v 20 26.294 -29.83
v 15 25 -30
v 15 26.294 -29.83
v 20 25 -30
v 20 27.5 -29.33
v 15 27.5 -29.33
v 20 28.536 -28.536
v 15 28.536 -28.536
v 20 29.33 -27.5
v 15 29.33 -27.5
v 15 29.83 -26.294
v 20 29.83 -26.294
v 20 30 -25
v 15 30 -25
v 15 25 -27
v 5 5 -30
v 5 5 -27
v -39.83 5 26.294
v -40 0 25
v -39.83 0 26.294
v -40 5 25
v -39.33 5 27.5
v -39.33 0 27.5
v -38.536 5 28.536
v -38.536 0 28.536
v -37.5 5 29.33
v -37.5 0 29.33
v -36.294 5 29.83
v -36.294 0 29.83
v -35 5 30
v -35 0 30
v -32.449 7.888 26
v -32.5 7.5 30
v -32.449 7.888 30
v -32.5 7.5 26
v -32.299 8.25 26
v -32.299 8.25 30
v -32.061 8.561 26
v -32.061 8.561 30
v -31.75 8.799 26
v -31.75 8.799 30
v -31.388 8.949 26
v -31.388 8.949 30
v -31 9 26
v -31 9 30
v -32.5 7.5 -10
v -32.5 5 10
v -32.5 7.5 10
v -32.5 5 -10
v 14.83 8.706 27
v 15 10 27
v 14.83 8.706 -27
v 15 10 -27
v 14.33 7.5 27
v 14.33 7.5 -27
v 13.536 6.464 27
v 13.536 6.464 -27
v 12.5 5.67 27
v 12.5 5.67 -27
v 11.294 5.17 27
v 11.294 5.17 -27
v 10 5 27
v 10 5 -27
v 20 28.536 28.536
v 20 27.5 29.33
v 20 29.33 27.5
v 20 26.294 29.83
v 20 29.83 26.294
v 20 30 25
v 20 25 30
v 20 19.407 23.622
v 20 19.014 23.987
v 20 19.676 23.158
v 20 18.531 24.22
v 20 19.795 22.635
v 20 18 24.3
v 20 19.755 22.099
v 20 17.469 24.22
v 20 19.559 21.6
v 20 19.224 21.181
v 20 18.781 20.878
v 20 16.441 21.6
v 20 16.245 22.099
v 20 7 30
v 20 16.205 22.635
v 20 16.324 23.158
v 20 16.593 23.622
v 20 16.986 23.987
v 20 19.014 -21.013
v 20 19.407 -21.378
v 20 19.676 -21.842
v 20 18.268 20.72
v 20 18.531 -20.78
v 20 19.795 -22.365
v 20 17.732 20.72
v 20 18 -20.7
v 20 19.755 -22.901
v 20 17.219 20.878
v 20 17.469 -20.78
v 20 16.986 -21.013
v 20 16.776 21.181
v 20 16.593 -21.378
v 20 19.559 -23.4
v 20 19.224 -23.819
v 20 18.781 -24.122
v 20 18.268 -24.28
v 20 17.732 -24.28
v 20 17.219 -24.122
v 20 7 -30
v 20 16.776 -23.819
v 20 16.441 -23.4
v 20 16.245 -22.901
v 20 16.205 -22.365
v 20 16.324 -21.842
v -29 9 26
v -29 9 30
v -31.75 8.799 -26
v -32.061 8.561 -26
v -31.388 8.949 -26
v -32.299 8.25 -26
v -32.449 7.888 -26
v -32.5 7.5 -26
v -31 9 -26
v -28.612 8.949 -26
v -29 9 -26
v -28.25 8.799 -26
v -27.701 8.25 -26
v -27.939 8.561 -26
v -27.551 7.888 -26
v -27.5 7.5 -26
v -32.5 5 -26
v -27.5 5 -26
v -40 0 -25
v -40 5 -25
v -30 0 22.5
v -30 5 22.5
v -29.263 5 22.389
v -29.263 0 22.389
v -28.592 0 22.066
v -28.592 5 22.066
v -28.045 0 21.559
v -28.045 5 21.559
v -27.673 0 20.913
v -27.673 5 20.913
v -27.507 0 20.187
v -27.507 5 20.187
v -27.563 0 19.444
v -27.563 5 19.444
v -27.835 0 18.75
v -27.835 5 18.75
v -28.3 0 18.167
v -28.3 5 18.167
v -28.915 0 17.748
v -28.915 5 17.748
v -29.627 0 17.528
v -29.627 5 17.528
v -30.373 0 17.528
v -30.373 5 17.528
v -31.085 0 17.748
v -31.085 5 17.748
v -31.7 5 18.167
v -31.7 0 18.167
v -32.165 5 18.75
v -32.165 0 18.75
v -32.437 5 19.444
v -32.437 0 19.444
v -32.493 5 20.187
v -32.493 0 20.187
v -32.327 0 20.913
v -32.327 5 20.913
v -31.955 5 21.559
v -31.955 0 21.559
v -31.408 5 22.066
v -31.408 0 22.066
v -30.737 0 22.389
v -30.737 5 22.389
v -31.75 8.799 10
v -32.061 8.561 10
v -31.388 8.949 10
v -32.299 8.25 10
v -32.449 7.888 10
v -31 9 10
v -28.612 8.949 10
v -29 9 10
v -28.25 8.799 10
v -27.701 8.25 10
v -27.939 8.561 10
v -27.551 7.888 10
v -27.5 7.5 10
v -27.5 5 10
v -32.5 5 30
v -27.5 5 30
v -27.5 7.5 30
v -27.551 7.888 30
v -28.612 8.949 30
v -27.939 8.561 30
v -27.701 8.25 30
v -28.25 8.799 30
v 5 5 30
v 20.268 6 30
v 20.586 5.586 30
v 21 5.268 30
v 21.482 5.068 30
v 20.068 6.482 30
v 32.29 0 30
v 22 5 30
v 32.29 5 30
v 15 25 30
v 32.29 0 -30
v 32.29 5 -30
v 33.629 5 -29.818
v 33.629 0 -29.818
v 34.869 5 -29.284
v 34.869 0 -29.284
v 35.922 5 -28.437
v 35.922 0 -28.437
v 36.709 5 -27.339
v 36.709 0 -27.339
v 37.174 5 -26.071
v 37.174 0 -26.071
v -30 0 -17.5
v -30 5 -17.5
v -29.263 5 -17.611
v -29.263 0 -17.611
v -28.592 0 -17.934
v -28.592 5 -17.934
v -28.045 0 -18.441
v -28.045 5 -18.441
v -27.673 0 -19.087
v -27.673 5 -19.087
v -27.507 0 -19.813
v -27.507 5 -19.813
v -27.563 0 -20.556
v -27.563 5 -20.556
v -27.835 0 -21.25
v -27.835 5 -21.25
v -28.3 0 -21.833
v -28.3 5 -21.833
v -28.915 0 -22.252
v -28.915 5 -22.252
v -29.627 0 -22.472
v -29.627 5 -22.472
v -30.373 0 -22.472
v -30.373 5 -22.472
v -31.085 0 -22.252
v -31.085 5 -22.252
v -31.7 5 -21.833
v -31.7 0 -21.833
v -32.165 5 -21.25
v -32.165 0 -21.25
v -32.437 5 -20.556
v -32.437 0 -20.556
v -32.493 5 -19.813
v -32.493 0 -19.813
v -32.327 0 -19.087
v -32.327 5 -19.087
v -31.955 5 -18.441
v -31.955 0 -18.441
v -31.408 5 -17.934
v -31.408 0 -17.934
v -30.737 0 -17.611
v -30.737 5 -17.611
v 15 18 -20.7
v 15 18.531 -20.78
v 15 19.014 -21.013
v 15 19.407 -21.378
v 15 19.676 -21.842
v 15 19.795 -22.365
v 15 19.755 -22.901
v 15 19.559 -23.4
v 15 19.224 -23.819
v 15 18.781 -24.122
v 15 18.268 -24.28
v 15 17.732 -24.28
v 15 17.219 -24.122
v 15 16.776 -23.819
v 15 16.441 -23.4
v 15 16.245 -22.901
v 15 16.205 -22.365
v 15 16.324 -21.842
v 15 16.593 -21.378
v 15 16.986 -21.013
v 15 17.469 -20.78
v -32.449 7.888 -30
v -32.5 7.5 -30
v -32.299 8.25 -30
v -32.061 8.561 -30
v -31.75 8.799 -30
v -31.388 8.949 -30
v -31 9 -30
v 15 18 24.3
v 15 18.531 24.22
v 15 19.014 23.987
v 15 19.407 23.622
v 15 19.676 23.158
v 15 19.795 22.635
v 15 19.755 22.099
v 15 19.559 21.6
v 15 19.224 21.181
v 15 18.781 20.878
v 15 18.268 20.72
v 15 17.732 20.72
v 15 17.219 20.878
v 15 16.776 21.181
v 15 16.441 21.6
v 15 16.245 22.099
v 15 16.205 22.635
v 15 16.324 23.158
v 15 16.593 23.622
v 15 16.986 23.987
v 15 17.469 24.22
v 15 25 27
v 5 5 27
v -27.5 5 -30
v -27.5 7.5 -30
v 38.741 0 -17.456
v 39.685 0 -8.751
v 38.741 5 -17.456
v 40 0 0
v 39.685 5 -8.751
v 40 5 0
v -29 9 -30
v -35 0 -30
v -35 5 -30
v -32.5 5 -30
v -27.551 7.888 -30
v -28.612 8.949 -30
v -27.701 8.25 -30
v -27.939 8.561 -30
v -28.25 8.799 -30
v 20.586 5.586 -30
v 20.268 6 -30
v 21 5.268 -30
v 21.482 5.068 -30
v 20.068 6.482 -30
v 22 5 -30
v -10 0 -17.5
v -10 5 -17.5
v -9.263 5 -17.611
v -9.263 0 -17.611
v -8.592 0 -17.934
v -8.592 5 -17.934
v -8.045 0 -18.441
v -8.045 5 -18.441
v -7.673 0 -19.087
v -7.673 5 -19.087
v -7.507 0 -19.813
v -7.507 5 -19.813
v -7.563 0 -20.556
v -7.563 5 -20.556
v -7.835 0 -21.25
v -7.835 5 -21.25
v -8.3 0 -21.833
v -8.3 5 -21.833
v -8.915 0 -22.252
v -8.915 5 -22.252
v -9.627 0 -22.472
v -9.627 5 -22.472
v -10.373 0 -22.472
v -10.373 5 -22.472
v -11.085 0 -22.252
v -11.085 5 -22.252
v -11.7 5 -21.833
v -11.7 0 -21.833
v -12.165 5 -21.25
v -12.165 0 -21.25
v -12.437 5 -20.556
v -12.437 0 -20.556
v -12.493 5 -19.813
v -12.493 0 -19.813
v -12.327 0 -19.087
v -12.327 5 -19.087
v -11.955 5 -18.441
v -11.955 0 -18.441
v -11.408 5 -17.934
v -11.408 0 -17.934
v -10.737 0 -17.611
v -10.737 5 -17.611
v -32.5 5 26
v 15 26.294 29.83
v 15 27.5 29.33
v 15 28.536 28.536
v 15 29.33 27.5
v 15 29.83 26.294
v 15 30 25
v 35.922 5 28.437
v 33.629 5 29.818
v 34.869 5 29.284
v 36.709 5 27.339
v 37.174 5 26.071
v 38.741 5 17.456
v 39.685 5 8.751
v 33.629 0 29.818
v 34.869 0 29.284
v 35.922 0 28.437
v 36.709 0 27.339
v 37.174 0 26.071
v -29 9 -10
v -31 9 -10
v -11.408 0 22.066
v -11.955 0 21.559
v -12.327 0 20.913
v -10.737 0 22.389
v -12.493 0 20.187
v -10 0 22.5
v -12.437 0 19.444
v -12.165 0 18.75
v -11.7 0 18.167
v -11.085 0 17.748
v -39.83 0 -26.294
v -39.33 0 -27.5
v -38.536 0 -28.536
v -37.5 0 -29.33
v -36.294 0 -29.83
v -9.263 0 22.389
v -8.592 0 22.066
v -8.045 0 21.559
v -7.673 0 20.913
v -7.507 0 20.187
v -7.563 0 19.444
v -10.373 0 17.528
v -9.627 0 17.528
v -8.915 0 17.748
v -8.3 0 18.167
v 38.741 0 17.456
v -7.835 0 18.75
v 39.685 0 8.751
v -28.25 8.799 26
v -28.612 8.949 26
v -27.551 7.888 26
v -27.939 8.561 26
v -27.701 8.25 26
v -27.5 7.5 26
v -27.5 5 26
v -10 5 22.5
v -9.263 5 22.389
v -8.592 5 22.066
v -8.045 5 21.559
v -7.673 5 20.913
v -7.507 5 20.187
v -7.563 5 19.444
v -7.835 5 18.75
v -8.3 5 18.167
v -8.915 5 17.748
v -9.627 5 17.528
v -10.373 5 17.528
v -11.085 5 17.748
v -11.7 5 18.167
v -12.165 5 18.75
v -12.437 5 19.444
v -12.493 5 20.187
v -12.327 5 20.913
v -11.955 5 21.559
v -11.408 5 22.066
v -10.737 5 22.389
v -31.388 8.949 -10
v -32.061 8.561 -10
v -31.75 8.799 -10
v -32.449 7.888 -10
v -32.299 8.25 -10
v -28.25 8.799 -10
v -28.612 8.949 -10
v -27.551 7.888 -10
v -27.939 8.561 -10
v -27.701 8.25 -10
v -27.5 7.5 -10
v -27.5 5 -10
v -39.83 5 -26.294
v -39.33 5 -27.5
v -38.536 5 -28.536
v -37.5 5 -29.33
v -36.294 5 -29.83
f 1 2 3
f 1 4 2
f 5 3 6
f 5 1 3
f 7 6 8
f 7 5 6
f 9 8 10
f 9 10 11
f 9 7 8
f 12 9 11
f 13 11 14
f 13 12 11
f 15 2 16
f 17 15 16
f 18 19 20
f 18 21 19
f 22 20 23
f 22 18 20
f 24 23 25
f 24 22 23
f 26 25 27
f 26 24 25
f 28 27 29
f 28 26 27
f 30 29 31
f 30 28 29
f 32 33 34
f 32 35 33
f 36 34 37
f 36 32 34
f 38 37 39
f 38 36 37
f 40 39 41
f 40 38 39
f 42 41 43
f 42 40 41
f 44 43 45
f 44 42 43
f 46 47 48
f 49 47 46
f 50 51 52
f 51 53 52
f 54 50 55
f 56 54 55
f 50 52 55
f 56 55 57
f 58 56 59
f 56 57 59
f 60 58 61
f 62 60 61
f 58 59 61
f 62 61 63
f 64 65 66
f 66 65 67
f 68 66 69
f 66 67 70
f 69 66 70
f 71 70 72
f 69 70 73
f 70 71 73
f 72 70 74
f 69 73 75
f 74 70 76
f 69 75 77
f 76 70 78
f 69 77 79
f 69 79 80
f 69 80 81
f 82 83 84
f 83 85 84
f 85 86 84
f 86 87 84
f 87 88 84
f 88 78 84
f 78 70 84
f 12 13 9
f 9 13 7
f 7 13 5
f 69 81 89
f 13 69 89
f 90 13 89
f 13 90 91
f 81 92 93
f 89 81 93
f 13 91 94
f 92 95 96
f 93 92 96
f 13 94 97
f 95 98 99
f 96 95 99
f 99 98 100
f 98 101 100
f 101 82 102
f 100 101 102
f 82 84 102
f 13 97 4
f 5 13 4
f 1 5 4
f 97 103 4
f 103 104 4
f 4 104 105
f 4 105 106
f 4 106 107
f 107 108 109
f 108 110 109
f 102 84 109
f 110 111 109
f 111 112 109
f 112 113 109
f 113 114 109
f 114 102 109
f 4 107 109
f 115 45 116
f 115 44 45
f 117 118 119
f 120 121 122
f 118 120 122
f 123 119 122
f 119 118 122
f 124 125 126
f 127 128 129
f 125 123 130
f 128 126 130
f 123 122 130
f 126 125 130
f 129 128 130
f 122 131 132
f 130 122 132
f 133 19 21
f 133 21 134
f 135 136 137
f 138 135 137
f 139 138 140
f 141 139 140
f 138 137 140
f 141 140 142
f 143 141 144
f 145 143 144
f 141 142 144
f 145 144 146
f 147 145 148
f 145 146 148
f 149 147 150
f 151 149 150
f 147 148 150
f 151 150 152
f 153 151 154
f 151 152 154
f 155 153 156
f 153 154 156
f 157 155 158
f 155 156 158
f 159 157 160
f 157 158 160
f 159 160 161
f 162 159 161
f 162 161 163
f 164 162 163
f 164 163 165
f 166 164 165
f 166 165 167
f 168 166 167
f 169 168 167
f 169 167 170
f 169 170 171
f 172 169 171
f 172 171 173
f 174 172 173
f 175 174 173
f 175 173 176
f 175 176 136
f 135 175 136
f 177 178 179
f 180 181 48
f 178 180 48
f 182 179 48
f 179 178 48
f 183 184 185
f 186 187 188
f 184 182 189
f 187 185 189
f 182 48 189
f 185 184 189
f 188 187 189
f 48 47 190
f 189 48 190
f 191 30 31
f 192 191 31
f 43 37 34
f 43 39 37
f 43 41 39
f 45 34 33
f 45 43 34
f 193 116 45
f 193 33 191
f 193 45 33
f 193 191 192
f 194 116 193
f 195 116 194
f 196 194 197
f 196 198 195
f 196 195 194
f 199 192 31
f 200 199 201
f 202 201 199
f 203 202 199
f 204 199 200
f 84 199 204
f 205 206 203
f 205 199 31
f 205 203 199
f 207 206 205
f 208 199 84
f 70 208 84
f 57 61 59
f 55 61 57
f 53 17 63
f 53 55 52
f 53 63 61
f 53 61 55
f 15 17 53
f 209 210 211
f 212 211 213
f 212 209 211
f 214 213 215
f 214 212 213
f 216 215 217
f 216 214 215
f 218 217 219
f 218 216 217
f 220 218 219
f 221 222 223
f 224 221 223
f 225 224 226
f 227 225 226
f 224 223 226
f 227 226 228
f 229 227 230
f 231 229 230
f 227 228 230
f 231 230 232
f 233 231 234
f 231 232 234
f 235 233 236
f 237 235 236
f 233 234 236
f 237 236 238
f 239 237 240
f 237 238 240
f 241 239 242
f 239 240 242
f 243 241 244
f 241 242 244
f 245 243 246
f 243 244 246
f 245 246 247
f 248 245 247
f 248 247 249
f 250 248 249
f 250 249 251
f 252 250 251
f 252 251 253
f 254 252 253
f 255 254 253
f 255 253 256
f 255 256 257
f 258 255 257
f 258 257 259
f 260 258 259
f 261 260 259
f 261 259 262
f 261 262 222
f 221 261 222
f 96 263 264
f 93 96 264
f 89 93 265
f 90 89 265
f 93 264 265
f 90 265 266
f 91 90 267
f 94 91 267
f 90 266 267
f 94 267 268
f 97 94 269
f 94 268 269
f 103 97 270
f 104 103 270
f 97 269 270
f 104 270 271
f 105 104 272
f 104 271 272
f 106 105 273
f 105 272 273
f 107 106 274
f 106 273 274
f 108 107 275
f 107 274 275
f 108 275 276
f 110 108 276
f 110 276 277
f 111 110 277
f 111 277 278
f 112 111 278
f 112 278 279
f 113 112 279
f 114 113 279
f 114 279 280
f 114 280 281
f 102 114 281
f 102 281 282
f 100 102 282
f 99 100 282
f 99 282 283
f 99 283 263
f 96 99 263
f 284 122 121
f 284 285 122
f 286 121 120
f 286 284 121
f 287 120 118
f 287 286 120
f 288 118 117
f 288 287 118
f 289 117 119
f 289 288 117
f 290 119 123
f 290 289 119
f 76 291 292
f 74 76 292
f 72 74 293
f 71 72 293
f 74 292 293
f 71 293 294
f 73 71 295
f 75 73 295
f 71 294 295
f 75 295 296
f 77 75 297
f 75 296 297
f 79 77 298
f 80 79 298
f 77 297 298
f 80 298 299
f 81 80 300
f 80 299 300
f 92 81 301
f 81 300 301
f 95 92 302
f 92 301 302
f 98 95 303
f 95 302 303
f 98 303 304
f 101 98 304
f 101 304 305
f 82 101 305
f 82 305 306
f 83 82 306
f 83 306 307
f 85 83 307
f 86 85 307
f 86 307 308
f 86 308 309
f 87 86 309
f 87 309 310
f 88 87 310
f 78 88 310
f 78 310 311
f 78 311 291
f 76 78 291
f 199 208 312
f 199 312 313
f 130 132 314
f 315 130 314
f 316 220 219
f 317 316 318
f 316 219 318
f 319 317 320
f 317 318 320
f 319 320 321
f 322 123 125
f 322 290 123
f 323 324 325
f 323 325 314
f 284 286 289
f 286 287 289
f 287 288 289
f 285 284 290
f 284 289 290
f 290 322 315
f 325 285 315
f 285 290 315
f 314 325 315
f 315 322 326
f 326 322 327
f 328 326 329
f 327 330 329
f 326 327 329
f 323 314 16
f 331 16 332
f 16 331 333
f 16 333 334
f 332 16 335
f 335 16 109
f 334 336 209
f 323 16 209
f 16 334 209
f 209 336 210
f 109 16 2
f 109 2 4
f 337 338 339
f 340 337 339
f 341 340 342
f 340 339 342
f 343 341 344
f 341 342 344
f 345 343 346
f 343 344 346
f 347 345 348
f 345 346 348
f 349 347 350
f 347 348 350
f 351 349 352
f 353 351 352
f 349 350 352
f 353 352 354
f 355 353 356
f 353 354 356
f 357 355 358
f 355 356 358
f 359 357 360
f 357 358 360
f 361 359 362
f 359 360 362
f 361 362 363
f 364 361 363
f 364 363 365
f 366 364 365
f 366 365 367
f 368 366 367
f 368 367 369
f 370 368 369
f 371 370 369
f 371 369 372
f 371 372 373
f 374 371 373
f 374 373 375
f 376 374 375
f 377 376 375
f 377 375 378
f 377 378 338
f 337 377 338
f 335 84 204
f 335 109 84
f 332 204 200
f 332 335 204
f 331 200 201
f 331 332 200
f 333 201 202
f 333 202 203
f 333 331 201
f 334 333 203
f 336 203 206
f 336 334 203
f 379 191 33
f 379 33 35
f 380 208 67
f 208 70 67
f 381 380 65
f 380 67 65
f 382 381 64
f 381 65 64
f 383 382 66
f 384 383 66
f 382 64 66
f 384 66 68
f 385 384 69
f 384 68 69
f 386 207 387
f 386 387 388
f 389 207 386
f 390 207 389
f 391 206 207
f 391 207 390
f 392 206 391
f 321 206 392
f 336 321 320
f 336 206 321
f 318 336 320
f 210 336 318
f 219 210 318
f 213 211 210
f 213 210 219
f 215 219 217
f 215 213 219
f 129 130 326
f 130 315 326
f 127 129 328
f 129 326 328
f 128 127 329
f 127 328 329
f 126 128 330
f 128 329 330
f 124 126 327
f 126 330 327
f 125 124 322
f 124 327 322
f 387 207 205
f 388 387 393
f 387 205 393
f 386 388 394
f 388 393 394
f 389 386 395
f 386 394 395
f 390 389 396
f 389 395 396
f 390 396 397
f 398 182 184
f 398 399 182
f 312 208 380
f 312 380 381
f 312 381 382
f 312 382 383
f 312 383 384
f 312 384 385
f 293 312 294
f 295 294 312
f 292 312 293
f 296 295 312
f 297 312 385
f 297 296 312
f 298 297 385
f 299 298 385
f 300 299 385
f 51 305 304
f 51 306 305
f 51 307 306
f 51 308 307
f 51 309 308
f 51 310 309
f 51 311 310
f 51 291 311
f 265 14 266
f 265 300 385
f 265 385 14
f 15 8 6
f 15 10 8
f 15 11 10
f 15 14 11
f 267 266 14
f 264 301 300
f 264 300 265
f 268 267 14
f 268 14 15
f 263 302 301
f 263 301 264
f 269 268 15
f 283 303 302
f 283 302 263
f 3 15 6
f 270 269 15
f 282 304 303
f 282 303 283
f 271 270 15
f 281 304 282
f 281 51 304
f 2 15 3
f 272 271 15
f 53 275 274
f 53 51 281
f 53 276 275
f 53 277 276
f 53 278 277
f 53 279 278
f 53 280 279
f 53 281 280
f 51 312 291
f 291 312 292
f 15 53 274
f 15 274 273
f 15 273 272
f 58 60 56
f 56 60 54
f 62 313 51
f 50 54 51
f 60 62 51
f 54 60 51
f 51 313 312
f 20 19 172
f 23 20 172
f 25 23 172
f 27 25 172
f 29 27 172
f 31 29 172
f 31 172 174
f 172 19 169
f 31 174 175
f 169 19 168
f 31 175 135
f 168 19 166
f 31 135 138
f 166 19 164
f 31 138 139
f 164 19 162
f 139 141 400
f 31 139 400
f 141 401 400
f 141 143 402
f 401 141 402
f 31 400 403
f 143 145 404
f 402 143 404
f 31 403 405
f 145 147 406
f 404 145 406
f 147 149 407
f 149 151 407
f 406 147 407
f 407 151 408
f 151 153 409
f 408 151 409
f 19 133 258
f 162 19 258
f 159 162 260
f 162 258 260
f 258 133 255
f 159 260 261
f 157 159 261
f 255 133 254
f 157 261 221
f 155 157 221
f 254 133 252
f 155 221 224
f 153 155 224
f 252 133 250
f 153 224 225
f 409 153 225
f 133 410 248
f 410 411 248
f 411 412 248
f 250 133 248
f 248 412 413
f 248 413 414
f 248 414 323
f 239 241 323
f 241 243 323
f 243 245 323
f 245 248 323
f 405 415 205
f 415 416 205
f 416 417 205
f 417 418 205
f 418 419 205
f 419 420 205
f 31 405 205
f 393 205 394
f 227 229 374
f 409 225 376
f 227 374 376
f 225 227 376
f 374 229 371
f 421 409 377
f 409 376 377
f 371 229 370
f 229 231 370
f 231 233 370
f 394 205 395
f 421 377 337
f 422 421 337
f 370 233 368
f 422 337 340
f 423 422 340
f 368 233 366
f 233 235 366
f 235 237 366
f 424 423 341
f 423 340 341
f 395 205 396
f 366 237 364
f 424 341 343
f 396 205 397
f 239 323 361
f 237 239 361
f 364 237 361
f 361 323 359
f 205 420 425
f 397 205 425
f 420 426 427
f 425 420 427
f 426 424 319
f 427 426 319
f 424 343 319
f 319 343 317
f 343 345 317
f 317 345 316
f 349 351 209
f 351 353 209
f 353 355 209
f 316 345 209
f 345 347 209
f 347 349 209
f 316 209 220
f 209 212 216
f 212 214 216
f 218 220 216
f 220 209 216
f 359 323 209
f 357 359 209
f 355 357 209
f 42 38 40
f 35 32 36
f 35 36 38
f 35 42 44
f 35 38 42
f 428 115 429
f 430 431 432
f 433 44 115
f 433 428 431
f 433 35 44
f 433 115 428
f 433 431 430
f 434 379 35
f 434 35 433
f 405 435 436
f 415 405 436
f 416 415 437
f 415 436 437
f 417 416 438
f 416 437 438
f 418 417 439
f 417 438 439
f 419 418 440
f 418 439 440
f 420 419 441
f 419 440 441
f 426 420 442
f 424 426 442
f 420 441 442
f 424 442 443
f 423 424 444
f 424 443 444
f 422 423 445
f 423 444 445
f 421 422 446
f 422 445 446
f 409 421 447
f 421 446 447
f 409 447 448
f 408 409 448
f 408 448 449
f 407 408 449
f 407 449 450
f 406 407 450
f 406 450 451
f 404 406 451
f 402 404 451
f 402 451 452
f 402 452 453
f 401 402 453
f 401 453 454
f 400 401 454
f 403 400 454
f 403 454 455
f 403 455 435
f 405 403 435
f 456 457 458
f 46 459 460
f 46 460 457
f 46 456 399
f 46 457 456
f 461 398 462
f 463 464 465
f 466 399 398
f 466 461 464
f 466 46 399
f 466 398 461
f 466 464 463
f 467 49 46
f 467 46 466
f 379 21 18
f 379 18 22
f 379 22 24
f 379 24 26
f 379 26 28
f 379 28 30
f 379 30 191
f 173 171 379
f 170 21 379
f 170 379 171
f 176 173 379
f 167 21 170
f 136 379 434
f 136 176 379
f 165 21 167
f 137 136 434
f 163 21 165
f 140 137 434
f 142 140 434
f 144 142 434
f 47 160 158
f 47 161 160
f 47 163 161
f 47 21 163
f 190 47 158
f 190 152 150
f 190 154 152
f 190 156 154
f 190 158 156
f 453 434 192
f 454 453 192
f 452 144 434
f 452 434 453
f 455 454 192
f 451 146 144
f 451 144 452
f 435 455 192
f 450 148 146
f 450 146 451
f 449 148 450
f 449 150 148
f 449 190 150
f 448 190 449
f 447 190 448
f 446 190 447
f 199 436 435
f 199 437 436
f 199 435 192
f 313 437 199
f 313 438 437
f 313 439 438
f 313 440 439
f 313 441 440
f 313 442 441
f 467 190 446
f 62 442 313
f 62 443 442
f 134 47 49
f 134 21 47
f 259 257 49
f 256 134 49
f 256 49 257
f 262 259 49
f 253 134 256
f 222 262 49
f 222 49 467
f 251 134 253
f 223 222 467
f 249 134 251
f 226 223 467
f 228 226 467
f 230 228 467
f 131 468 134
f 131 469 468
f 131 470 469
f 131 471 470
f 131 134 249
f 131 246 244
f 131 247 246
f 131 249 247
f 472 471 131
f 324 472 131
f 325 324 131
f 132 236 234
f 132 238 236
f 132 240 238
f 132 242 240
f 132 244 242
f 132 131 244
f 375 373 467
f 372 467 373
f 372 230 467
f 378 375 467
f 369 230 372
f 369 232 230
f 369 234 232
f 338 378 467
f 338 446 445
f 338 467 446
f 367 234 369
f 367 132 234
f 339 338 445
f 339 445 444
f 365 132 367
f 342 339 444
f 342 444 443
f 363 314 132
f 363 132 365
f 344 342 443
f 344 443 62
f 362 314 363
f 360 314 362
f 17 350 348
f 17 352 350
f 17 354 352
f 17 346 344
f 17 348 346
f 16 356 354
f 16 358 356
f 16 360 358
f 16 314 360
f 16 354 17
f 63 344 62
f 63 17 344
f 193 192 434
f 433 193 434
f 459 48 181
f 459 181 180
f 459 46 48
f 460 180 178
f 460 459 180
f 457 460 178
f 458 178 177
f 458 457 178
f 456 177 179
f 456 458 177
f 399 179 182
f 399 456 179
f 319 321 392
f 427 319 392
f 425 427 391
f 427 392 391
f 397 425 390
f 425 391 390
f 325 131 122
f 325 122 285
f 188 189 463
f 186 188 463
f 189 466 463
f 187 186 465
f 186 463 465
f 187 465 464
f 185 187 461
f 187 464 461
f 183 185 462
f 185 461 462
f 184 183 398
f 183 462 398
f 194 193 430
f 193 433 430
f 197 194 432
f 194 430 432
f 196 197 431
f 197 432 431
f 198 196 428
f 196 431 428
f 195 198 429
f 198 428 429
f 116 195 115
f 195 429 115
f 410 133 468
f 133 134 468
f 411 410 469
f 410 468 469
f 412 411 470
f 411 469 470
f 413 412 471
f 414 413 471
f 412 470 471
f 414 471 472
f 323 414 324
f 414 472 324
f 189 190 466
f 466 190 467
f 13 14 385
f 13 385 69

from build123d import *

# Parameters (mm, degrees)
SKETCH1_W           = 80
SKETCH1_H           = 60
BOSS_EXTRUDE1_DEPTH = 5
SKETCH2_W           = 5
SKETCH2_H           = 60
BOSS_EXTRUDE2_DEPTH = 25
SKETCH3_R           = 1.8
CUT_EXTRUDE1_DEPTH  = 30
CUT_EXTRUDE2_DEPTH  = 30
FILLET1_R           = 5
SKETCH6_R           = 2.5
CUT_EXTRUDE3_DEPTH  = 30
SKETCH8_W           = 5
SKETCH8_H           = 20
SKETCH8_H_2         = 4
BOSS_EXTRUDE3_DEPTH = 4
FILLET3_R           = 1.5
BOSS_EXTRUDE4_DEPTH = 3
FILLET4_R           = 5
FILLET5_R           = 2


with BuildPart() as part:
    # Sketch1 → Boss-Extrude1 (new body)
    with BuildSketch(Plane(origin=(0, 0, 0), x_dir=(1, 0, 0), z_dir=(0, 1, 0))):
        Rectangle(SKETCH1_W, SKETCH1_H)
    extrude(amount=BOSS_EXTRUDE1_DEPTH)

    # Sketch2 → Boss-Extrude2 (add)
    with BuildSketch(Plane(origin=(0, 5, 0), x_dir=(1, 0, 0), z_dir=(0, 1, 0))):
        with Locations((17.5, 0)):
            Rectangle(SKETCH2_W, SKETCH2_H)
    extrude(amount=BOSS_EXTRUDE2_DEPTH)

    # Sketch3 → Cut-Extrude1 (cut)
    with BuildSketch(Plane.ZY.offset(-15)):
        with Locations((-22.5, 18)):
            Circle(SKETCH3_R)
        with Locations((22.5, 18)):
            Circle(SKETCH3_R)
    extrude(amount=-CUT_EXTRUDE1_DEPTH, mode=Mode.SUBTRACT)

    # Sketch5 → Cut-Extrude2 (cut)
    with BuildSketch(Plane(origin=(0, 5, 0), x_dir=(1, 0, 0), z_dir=(0, 1, 0))):
        with BuildLine():
            Line((40, 30), (36.243947384, 30))
            ThreePointArc((36.243947384, 30), (39.057335538, 15.117108944), (40, 0))
            Line((40, 0), (40, 30))
        make_face()
        with BuildLine():
            Line((40, -30), (40, 0))
            ThreePointArc((40, 0), (39.057335538, -15.117108944), (36.243947384, -30))
            Line((36.243947384, -30), (40, -30))
        make_face()
    extrude(amount=-CUT_EXTRUDE2_DEPTH, mode=Mode.SUBTRACT)

    # Fillet1
    fillet1_edges = [part.edges().sort_by_distance(p)[0] for p in [
        (17.5, 30, 30),
        (17.5, 30, -30),
        (36.243947384, 2.5, 30),
        (36.243947384, 2.5, -30),
        (-40, 2.5, -30),
        (-40, 2.5, 30),
    ]]
    fillet(fillet1_edges, radius=FILLET1_R)

    # Sketch6 → Cut-Extrude3 (cut)
    with BuildSketch(Plane(origin=(0, 5, 0), x_dir=(1, 0, 0), z_dir=(0, 1, 0))):
        with Locations(Location((-30, 20, 0), (0, 0, 270))):
            Circle(SKETCH6_R)
        with Locations(Location((-30, -20, 0), (0, 0, 270))):
            Circle(SKETCH6_R)
        with Locations(Location((-10, 20, 0), (0, 0, 270))):
            Circle(SKETCH6_R)
        with Locations(Location((-10, -20, 0), (0, 0, 270))):
            Circle(SKETCH6_R)
    extrude(amount=-CUT_EXTRUDE3_DEPTH, mode=Mode.SUBTRACT)

    # Sketch8 → Boss-Extrude3 (add)
    with BuildSketch(Plane(origin=(0, 5, 0), x_dir=(1, 0, 0), z_dir=(0, 1, 0))):
        with Locations((-30, 0)):
            Rectangle(SKETCH8_W, SKETCH8_H)
        with Locations((-30, 28)):
            Rectangle(SKETCH8_W, SKETCH8_H_2)
        with Locations((-30, -28)):
            Rectangle(SKETCH8_W, SKETCH8_H_2)
    extrude(amount=BOSS_EXTRUDE3_DEPTH)

    # Fillet3
    fillet3_edges = [part.edges().sort_by_distance(p)[0] for p in [
        (-32.5, 9, 0),
        (-27.5, 9, 0),
        (-27.5, 9, -28),
        (-32.5, 9, -28),
        (-27.5, 9, 28),
        (-32.5, 9, 28),
    ]]
    fillet(fillet3_edges, radius=FILLET3_R)

    # Sketch9 → Boss-Extrude4 (add)
    with BuildSketch(Plane.XY.offset(30)):
        Polygon((15, 25), (5, 5), (15, 5), align=None)
    boss_extrude4 = extrude(amount=-BOSS_EXTRUDE4_DEPTH)

    # Mirror1: Boss-Extrude4 across plane
    add(boss_extrude4.mirror(Plane.XY))

    # Fillet4
    fillet4_edges = [part.edges().sort_by_distance(p)[0] for p in [
        (15, 5, 0),
    ]]
    fillet(fillet4_edges, radius=FILLET4_R)

    # Fillet5
    fillet5_edges = [part.edges().sort_by_distance(p)[0] for p in [
        (20, 5, 0),
    ]]
    fillet(fillet5_edges, radius=FILLET5_R)


solid = part.part
